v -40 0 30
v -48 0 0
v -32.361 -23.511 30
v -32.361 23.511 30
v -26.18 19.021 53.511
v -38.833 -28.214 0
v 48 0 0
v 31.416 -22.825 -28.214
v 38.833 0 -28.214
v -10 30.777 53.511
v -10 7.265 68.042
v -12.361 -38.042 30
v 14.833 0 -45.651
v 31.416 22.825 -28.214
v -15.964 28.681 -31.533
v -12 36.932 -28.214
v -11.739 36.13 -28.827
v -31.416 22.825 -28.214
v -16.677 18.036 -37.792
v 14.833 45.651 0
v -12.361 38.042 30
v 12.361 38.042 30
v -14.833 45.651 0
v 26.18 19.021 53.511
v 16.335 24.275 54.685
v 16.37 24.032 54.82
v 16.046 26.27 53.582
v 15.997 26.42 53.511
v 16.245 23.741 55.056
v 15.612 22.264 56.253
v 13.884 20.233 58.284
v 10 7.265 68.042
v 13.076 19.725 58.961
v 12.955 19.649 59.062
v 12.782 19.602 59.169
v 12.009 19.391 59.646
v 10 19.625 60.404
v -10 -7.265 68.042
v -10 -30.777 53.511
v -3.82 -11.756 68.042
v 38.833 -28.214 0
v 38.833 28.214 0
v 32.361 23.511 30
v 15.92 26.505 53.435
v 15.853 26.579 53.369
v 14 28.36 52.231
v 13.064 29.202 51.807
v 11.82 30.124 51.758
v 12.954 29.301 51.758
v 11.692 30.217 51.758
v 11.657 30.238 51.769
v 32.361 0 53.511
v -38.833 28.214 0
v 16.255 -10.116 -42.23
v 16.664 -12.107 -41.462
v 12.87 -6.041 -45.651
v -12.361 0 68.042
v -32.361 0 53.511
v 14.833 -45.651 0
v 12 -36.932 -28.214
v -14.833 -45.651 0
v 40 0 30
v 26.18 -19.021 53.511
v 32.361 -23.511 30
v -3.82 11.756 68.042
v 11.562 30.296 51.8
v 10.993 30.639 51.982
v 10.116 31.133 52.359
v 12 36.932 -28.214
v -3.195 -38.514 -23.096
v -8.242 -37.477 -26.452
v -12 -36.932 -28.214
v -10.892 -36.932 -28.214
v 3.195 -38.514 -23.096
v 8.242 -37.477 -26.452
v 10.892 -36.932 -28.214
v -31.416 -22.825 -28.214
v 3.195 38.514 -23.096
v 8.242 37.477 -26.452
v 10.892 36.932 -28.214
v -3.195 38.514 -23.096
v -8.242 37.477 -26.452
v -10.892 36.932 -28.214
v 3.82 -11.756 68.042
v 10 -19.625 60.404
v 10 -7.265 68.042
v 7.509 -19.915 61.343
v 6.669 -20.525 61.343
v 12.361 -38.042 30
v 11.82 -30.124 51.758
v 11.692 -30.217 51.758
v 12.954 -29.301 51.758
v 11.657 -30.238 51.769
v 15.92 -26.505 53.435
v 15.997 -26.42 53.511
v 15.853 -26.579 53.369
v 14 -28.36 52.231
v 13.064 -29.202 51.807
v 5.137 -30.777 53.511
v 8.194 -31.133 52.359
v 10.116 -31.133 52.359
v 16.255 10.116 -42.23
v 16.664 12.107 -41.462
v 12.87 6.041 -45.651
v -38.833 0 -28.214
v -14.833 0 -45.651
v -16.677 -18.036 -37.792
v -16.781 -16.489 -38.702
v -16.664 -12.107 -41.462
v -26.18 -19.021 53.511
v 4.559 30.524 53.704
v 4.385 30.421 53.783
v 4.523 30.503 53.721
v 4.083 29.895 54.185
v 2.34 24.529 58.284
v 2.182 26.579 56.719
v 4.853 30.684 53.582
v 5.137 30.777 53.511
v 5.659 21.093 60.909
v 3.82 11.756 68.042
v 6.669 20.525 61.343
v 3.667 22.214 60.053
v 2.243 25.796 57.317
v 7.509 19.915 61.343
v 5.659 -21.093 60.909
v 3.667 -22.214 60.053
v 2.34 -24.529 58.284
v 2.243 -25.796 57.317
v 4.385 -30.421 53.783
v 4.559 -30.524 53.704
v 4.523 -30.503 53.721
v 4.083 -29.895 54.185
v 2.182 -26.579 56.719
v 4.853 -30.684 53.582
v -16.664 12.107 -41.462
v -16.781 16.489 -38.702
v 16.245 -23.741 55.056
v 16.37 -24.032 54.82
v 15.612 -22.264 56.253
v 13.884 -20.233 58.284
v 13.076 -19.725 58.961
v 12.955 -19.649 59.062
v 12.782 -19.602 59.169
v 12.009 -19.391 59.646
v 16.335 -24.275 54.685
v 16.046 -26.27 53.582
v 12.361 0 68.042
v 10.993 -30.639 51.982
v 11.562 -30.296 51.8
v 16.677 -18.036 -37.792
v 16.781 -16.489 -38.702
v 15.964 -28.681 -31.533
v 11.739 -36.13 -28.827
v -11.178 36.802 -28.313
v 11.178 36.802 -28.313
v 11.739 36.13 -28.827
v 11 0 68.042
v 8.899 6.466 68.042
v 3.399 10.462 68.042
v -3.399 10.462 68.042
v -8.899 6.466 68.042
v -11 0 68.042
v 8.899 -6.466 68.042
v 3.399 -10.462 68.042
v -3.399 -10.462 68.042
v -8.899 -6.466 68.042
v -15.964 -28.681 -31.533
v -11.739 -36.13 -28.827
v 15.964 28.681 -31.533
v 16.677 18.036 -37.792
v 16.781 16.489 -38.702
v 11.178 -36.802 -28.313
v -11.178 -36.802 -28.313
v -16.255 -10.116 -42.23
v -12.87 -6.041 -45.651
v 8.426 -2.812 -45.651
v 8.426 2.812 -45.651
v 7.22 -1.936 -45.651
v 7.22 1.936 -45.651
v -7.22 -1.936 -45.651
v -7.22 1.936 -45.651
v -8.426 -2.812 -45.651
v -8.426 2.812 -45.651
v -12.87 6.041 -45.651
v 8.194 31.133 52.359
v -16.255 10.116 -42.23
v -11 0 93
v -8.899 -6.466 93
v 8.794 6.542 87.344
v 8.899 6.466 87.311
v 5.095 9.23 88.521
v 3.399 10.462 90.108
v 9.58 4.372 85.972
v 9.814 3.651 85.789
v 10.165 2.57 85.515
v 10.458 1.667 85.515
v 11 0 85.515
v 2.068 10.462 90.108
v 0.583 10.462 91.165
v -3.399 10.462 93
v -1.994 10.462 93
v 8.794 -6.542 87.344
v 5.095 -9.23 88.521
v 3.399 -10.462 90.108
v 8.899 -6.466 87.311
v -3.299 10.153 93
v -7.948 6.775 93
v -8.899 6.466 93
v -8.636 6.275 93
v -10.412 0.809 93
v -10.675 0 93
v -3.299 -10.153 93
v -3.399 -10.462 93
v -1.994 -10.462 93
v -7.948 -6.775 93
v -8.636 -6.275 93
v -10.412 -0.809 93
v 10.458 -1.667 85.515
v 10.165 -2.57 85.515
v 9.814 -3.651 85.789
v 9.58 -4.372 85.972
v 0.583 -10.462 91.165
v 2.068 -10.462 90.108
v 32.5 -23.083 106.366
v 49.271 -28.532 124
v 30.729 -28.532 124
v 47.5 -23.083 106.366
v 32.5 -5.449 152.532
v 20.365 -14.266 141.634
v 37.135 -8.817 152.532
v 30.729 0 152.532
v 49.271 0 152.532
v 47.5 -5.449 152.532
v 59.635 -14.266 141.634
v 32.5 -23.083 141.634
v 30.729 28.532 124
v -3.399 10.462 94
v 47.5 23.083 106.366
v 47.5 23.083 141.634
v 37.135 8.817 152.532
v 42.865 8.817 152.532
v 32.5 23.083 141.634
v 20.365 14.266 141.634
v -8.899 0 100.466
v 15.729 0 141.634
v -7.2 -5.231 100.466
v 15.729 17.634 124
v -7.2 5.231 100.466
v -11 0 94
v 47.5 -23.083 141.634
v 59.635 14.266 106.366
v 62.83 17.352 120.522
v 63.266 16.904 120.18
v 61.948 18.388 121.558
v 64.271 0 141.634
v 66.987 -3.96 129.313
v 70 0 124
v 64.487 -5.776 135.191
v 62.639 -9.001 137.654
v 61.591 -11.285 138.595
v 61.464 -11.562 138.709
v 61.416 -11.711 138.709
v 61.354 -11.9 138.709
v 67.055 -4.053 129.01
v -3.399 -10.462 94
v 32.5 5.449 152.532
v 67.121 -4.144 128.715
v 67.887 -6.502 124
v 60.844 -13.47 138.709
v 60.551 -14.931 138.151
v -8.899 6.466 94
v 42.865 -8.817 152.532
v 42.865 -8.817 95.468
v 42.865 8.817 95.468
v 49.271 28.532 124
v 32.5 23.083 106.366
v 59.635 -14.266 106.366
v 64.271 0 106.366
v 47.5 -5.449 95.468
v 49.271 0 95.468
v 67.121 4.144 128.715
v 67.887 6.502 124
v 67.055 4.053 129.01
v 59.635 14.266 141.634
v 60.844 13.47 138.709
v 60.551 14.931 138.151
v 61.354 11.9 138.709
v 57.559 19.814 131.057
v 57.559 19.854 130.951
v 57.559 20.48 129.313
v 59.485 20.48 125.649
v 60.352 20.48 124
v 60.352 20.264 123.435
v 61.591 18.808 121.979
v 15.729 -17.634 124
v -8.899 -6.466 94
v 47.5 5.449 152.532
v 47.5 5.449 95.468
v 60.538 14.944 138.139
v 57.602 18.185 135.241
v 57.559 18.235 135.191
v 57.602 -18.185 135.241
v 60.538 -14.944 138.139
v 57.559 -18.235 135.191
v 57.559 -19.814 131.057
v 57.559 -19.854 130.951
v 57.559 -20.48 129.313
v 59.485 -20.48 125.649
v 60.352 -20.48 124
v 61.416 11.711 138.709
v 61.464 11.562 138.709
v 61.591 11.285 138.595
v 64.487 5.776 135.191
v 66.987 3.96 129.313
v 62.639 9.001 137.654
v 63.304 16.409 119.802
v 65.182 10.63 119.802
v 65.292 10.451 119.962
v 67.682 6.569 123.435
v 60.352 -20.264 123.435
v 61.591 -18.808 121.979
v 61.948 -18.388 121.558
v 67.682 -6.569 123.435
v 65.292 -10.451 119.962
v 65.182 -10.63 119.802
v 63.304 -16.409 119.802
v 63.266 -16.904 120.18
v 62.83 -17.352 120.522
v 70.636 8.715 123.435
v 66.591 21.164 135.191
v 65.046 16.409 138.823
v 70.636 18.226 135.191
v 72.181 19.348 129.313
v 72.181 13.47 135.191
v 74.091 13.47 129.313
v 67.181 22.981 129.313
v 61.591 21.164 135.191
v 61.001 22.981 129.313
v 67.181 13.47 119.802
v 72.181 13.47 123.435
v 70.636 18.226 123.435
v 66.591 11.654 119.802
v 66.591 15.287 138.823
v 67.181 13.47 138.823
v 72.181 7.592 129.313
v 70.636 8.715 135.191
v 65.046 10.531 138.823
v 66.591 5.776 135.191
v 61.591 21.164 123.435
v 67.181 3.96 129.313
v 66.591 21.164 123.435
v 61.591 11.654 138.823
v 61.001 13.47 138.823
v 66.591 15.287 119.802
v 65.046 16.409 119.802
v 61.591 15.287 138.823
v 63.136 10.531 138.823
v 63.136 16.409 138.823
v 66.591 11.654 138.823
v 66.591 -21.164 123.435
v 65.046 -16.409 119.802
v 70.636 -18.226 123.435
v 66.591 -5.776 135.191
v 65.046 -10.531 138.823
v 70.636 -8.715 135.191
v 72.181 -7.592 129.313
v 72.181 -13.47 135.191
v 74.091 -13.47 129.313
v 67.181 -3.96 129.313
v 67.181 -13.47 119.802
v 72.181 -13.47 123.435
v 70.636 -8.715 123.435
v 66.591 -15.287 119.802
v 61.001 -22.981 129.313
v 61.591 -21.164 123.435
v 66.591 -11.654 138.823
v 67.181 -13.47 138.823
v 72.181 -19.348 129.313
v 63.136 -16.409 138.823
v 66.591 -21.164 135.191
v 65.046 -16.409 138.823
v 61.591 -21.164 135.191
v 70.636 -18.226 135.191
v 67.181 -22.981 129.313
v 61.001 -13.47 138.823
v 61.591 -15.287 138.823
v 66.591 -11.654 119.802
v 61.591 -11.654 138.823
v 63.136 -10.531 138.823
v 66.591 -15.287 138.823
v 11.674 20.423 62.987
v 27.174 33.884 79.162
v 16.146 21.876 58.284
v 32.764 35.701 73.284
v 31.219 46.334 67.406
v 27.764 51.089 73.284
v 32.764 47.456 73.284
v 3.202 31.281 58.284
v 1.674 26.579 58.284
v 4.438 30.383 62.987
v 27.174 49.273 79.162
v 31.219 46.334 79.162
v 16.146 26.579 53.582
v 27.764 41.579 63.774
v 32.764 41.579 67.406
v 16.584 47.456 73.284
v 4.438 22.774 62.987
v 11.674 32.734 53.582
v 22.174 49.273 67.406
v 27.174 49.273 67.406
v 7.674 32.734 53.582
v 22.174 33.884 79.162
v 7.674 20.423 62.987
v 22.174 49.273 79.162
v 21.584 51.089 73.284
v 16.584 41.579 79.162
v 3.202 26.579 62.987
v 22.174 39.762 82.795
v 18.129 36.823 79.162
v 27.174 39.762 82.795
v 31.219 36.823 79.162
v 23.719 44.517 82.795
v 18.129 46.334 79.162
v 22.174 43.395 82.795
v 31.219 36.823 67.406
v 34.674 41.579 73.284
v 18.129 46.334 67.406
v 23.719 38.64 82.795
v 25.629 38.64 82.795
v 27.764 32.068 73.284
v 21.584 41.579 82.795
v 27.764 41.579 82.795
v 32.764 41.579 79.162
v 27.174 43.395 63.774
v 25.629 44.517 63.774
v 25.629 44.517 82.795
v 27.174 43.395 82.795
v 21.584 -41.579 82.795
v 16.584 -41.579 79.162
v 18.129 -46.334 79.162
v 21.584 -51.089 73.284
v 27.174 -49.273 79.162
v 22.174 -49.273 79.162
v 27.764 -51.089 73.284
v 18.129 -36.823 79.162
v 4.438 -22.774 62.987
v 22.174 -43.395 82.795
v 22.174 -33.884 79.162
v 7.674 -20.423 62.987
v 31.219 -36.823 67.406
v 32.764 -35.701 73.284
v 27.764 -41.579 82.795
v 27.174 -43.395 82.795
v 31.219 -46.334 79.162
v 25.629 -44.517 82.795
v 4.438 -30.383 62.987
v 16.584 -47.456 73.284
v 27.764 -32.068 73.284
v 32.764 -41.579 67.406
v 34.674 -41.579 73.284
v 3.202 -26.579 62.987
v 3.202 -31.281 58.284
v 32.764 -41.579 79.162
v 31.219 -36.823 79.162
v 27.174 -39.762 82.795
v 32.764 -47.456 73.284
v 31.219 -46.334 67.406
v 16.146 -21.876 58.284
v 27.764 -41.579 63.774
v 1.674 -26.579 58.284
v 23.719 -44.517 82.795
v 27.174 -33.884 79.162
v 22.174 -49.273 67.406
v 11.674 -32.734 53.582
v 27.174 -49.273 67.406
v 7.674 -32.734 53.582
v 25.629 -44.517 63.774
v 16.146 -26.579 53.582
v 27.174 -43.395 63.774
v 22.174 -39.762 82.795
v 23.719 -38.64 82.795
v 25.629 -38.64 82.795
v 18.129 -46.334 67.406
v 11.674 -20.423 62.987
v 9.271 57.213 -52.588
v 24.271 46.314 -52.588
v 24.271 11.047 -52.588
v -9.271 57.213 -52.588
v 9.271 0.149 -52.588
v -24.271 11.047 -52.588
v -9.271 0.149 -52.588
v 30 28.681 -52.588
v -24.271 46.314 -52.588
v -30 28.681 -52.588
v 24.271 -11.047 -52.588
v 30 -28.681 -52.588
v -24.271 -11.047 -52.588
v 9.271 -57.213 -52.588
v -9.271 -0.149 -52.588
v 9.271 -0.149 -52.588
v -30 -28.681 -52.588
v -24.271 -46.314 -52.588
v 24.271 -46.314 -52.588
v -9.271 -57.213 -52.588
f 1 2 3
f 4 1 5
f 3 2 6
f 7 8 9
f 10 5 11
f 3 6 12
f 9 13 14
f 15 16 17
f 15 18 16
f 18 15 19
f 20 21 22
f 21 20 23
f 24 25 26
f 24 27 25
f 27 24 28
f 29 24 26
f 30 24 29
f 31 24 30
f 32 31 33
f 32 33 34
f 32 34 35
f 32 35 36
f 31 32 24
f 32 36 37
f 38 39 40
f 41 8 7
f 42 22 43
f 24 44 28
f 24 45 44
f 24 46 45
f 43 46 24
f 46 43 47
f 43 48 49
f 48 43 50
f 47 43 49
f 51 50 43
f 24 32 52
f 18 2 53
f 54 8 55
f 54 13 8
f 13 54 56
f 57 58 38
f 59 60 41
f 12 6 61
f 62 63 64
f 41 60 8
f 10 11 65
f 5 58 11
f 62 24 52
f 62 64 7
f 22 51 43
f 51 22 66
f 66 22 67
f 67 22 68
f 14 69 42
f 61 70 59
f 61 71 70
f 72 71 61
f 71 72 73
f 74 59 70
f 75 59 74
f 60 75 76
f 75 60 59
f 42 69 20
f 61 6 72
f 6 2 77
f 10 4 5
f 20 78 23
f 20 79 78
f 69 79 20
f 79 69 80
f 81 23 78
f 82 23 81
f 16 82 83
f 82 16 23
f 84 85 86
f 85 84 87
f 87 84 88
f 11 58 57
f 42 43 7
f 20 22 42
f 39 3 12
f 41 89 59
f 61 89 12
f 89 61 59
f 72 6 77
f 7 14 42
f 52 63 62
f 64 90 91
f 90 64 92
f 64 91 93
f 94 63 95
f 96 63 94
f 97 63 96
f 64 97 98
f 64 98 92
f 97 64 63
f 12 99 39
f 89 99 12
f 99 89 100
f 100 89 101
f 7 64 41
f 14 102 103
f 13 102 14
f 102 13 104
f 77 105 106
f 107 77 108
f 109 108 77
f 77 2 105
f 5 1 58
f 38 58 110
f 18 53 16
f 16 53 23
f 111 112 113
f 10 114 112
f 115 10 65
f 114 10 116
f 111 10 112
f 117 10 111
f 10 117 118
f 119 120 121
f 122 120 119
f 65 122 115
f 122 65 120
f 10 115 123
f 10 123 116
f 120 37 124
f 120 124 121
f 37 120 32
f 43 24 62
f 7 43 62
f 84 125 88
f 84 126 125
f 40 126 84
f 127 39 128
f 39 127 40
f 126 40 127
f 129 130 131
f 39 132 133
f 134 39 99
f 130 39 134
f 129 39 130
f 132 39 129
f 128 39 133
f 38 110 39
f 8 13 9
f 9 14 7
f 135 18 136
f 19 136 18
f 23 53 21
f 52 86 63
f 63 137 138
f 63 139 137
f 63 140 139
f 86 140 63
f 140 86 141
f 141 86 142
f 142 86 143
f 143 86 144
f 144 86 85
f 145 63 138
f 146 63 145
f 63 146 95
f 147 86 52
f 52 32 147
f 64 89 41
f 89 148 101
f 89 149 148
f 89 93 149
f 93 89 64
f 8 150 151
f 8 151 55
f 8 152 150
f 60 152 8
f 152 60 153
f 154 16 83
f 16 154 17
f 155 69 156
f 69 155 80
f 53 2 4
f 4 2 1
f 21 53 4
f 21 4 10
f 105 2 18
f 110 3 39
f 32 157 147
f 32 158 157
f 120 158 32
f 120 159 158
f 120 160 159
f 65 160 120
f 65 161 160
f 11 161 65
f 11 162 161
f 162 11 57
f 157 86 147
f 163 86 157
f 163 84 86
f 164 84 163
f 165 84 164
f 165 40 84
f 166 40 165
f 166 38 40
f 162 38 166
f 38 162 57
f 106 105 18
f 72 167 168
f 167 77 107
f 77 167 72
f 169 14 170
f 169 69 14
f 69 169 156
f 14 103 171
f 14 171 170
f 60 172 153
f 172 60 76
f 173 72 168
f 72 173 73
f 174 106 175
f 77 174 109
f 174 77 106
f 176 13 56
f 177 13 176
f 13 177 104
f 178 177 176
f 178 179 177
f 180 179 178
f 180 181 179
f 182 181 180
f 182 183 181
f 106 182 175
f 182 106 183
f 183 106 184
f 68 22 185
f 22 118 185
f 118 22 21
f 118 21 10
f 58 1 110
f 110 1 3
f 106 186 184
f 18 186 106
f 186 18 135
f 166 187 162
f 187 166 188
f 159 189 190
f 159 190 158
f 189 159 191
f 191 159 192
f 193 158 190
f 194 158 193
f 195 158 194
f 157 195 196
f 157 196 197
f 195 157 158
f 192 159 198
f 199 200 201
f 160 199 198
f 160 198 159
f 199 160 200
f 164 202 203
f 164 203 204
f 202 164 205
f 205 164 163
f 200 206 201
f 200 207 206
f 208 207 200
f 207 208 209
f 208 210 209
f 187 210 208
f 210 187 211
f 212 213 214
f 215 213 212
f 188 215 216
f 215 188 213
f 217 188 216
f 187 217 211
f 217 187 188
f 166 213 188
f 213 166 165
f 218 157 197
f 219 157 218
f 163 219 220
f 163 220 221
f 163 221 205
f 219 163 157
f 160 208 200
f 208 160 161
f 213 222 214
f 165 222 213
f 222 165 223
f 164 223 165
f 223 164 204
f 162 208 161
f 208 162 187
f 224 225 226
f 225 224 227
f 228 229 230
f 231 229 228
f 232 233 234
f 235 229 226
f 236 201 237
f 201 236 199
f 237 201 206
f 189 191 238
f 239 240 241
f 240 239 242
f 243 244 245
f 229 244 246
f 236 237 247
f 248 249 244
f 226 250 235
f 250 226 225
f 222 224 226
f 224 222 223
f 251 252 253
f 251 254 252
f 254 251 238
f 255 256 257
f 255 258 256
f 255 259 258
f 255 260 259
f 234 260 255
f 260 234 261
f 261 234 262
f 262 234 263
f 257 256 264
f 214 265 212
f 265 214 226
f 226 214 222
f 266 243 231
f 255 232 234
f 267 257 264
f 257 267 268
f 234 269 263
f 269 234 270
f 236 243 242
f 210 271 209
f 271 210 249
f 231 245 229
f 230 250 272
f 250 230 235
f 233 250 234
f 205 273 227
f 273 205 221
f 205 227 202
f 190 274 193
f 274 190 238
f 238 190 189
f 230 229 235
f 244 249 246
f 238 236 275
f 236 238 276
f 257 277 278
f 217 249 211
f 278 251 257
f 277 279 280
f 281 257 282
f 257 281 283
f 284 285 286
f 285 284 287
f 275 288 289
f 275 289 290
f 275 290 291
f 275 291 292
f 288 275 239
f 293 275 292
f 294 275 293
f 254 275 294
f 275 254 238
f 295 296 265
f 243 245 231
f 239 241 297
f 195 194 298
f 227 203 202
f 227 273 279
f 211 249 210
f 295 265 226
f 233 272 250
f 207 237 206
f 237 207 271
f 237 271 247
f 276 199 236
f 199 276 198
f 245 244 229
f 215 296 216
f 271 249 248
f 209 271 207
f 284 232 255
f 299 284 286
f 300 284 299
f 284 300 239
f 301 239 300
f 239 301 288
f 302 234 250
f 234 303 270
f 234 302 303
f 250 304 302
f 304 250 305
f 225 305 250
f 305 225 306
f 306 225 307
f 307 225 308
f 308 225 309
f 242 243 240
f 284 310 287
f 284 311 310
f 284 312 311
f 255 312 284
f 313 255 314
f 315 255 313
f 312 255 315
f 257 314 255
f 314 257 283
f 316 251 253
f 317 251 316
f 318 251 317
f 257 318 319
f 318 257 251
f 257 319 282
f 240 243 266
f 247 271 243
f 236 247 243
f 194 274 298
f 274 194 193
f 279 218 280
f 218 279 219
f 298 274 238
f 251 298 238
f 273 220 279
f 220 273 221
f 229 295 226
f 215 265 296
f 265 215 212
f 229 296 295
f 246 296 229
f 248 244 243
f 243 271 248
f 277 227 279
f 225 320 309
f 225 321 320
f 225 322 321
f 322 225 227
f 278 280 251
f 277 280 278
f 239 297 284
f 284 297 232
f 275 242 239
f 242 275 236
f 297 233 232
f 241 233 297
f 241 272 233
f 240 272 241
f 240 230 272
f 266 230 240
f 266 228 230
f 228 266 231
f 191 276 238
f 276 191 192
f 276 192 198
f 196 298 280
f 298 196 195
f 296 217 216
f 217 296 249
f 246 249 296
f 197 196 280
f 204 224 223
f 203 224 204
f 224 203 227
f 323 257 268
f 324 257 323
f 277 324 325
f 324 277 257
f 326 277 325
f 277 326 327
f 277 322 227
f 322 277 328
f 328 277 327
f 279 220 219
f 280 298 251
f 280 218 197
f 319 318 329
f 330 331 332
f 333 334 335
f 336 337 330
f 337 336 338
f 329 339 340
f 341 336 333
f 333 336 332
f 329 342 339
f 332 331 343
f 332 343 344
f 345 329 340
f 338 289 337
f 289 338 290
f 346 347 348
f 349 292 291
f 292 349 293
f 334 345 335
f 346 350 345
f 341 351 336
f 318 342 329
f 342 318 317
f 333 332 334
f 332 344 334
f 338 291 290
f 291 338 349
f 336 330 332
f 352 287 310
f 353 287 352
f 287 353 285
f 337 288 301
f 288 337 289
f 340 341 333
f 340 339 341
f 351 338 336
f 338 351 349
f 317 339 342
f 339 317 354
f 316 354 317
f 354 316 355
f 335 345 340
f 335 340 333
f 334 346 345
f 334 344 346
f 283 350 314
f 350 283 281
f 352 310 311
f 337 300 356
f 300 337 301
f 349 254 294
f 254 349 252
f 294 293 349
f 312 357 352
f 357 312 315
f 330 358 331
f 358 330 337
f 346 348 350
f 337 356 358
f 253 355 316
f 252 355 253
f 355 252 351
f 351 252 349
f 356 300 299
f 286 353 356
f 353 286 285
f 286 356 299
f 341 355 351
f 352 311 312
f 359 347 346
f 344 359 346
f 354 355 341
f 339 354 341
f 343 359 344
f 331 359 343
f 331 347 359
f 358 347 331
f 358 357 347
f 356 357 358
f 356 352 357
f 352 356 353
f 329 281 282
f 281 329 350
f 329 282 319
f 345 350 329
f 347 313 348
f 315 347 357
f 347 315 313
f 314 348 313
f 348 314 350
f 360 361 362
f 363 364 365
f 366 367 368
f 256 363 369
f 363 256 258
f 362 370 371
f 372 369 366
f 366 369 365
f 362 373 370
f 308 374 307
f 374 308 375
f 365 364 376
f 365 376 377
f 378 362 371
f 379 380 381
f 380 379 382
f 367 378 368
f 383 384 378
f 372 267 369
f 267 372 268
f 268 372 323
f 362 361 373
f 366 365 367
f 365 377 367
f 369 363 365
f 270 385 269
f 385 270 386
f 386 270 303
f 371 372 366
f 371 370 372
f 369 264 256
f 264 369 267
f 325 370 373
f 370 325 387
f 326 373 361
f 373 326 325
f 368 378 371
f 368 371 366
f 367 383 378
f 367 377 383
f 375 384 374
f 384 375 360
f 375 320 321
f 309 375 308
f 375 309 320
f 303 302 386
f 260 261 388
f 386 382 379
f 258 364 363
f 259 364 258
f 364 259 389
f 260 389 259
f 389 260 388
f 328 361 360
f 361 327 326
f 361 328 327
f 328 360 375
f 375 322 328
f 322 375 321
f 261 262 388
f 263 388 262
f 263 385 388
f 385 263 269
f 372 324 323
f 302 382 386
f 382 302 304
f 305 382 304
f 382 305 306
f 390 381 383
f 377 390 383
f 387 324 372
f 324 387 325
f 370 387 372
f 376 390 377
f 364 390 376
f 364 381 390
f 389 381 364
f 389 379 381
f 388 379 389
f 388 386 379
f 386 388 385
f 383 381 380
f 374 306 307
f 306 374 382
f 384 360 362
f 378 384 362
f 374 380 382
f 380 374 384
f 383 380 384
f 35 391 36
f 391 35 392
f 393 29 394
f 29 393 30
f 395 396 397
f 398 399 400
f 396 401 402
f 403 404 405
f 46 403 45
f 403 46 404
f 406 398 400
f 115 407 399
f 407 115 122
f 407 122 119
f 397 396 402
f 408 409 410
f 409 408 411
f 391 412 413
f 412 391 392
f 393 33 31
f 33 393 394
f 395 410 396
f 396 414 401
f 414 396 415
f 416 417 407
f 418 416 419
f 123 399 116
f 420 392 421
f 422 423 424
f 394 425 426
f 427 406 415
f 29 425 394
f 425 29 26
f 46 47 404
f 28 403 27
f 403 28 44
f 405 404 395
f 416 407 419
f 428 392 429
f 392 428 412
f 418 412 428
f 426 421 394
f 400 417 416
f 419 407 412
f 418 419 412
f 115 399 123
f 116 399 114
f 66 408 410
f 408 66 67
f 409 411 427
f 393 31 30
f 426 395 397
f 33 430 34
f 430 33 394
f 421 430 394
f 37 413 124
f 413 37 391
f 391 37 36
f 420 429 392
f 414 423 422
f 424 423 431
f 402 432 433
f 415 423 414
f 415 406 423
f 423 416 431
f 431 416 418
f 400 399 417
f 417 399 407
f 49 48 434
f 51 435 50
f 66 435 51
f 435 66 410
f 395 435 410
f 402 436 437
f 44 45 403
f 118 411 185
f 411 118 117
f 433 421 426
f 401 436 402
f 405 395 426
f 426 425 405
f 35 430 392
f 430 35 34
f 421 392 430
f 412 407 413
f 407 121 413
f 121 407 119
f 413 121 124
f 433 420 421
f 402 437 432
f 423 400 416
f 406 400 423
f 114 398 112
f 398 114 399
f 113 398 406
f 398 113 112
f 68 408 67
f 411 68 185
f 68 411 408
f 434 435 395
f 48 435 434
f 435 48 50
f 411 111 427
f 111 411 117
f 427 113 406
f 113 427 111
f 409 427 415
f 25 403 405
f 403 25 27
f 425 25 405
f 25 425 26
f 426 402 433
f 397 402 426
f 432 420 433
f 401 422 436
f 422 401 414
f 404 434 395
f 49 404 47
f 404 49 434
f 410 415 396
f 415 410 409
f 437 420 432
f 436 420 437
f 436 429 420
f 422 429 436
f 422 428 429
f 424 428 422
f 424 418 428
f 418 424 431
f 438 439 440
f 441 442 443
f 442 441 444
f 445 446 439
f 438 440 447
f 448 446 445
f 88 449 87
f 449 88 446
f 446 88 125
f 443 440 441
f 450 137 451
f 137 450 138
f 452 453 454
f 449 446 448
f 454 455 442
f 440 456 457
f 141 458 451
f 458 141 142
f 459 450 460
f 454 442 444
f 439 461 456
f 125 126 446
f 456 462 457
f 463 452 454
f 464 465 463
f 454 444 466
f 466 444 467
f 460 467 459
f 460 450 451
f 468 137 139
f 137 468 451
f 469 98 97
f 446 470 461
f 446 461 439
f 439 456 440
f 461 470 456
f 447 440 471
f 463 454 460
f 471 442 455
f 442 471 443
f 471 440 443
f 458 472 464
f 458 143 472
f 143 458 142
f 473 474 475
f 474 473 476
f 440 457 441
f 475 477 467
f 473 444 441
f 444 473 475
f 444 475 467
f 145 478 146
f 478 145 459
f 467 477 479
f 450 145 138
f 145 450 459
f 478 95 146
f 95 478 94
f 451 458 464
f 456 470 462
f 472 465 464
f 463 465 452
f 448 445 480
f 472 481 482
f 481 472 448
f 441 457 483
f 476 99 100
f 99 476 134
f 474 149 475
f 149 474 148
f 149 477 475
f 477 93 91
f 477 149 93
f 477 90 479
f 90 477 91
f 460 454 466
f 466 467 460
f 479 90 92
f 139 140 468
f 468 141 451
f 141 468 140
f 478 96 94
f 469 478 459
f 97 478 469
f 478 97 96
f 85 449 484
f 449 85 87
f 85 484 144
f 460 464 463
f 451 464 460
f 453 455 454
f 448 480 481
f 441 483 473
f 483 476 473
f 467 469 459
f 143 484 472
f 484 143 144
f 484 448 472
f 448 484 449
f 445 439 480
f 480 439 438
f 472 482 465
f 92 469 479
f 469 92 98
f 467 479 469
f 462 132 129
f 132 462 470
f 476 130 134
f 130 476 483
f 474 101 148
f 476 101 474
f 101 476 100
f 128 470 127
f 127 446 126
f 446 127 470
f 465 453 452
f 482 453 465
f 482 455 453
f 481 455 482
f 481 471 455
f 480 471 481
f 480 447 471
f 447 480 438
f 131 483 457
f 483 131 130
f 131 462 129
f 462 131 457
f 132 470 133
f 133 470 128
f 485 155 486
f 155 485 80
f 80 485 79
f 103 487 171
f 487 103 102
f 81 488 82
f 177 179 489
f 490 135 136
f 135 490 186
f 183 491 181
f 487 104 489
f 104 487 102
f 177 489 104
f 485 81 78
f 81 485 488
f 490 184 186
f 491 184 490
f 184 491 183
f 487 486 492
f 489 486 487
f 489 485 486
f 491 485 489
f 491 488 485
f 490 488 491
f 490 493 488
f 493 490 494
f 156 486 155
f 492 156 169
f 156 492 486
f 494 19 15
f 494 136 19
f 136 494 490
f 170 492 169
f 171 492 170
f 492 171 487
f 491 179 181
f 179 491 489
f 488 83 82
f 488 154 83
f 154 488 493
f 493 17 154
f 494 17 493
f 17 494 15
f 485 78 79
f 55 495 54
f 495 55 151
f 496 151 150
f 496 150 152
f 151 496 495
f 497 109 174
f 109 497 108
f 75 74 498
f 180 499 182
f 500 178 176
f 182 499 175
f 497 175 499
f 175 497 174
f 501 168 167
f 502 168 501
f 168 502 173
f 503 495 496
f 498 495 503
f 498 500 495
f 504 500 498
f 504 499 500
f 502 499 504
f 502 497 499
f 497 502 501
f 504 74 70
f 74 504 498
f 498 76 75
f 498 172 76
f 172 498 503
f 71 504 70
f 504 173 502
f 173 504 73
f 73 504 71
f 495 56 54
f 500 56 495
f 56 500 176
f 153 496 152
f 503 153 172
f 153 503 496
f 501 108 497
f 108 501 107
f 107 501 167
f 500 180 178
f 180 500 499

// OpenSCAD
/* Alien Configurable/Random
Version 1, Enero 2019
Escrito por Jorge Cifuentes (jorgecif at gmail dot com)*/

tipo="configurable"; //[configurable,random]

//Parametros de configuracion

//Resolution
$fn=10;
//Body radio
radio=40;
//Body height
long_cuerpo=30;

//Neck thickness
cuello_r=11;
//Neck lenght
cuello_h=30;

//Eyes size
ojos_r=10;
//Eyes elevation angle
theta_ojos=70;
//Eyes separation angle
phi_ojos=21;

//Arms thickness
brazos_r=10;
//Arms lenght
brazos_h=15;
//Arms elevation angle
theta_brazos=45;
//Arms separation angle
phi_brazos=70;

//Legs thickness
piernas_r=10;
//Arms lenght
piernas_h=30;
//Arms elevation angle
theta_piernas=160;
//Arms separation angle
phi_piernas=90;


/*
Coordenadas esfericas
phi=angulo entre x y y
theta=angulo entre z y el plano x-y - de 0 a 180
x = r*sin(theta)*cos(phi)
y = r*sin(theta)*sin(phi)
z = r*cos(theta)
*/


module alien(radio,long_cuerpo,cuello_r,cuello_h,ojos_r,theta_ojos,phi_ojos,brazos_r,brazos_h,theta_brazos,phi_brazos,piernas_r,piernas_h,theta_piernas,phi_piernas)
{
//Cuerpo
hull() {
 translate([0,0,long_cuerpo]) sphere(radio*1);
 sphere(radio*1.2);
 }

//Cuello
translate([0,0,(radio+long_cuerpo)*0.9])
cylinder(h=cuello_h,r=cuello_r);

//Cabeza
translate([0,0,radio+(cuello_h+long_cuerpo)*0.9])
hull() {
 translate([40,0,30]) sphere(radio*3/4);
 sphere(cuello_r);
 }
 
 //Ojos
xo = radio*sin(theta_ojos)*cos(phi_ojos);
yo = radio*sin(theta_ojos)*sin(phi_ojos);
z0 = radio*cos(theta_ojos);
translate([xo+40-cuello_r,yo+0,(z0+radio+cuello_h+30+long_cuerpo)*.9])
sphere(ojos_r);
translate([xo+40-cuello_r,(yo+0)*-1,(z0+radio+cuello_h+30+long_cuerpo)*.9])
sphere(ojos_r);
 
//Brazos
x = radio*sin(theta_brazos)*cos(phi_brazos);
y = radio*sin(theta_brazos)*sin(phi_brazos);
z = radio*cos(theta_brazos);
translate([x,y,z+long_cuerpo])

hull() {
 translate([brazos_h,brazos_h,brazos_h]) sphere(brazos_r);
 sphere(8);
 }
translate([x,-y,z+long_cuerpo])
hull() {
 translate([brazos_h,-1*brazos_h,brazos_h]) sphere(brazos_r);
 sphere(8);
 }
//Piernas
xp = radio*sin(theta_piernas)*cos(phi_piernas);
yp = radio*sin(theta_piernas)*sin(phi_piernas);
zp = radio*cos(theta_piernas);
translate([xp,yp,zp])
hull() {
 translate([0,15,-15]) cylinder(30,30,10);
 cylinder(8,8,8);
 }

translate([xp,-yp,zp])
hull() {
 translate([0,-15,-15]) cylinder(30,30,10);
 cylinder(8,8,8);
 }

}



module configurable_alien()
{
    alien(radio,long_cuerpo,cuello_r,cuello_h,ojos_r,theta_ojos,phi_ojos,brazos_r,brazos_h,theta_brazos,phi_brazos,piernas_r,piernas_h,theta_piernas,phi_piernas);
}

module random_alien()
{
    radio=rands(30,50,1)[0]; //40;
	long_cuerpo=rands(10,50,1)[0]; //30;
	cuello_r=rands(9,12,1)[0]; //11;
	cuello_h=rands(0,40,1)[0]; //30
	ojos_r=rands(5,20,1)[0]; //10
	theta_ojos=rands(45,90,1)[0]; //70
	phi_ojos=rands(0,45,1)[0]/2; //21
	brazos_r=rands(10,20,1)[0]; //10
	brazos_h=rands(10,20,1)[0];//30
	theta_brazos=rands(20,75,1)[0];//45
	phi_brazos=rands(60,90,1)[0]; //70
	piernas_r=rands(0,30,1)[0]; //10
	piernas_h=rands(10,60,1)[0];//30
	theta_piernas=rands(150,170,1)[0];//160
	phi_piernas=rands(70,110,1)[0];//90
    
	alien(radio,long_cuerpo,cuello_r,cuello_h,ojos_r,theta_ojos,phi_ojos,brazos_r,brazos_h,theta_brazos,phi_brazos,piernas_r,piernas_h,theta_piernas,phi_piernas);
}

if (tipo=="configurable")
{
    configurable_alien();
}

if (tipo=="random")
{
    random_alien();
}
